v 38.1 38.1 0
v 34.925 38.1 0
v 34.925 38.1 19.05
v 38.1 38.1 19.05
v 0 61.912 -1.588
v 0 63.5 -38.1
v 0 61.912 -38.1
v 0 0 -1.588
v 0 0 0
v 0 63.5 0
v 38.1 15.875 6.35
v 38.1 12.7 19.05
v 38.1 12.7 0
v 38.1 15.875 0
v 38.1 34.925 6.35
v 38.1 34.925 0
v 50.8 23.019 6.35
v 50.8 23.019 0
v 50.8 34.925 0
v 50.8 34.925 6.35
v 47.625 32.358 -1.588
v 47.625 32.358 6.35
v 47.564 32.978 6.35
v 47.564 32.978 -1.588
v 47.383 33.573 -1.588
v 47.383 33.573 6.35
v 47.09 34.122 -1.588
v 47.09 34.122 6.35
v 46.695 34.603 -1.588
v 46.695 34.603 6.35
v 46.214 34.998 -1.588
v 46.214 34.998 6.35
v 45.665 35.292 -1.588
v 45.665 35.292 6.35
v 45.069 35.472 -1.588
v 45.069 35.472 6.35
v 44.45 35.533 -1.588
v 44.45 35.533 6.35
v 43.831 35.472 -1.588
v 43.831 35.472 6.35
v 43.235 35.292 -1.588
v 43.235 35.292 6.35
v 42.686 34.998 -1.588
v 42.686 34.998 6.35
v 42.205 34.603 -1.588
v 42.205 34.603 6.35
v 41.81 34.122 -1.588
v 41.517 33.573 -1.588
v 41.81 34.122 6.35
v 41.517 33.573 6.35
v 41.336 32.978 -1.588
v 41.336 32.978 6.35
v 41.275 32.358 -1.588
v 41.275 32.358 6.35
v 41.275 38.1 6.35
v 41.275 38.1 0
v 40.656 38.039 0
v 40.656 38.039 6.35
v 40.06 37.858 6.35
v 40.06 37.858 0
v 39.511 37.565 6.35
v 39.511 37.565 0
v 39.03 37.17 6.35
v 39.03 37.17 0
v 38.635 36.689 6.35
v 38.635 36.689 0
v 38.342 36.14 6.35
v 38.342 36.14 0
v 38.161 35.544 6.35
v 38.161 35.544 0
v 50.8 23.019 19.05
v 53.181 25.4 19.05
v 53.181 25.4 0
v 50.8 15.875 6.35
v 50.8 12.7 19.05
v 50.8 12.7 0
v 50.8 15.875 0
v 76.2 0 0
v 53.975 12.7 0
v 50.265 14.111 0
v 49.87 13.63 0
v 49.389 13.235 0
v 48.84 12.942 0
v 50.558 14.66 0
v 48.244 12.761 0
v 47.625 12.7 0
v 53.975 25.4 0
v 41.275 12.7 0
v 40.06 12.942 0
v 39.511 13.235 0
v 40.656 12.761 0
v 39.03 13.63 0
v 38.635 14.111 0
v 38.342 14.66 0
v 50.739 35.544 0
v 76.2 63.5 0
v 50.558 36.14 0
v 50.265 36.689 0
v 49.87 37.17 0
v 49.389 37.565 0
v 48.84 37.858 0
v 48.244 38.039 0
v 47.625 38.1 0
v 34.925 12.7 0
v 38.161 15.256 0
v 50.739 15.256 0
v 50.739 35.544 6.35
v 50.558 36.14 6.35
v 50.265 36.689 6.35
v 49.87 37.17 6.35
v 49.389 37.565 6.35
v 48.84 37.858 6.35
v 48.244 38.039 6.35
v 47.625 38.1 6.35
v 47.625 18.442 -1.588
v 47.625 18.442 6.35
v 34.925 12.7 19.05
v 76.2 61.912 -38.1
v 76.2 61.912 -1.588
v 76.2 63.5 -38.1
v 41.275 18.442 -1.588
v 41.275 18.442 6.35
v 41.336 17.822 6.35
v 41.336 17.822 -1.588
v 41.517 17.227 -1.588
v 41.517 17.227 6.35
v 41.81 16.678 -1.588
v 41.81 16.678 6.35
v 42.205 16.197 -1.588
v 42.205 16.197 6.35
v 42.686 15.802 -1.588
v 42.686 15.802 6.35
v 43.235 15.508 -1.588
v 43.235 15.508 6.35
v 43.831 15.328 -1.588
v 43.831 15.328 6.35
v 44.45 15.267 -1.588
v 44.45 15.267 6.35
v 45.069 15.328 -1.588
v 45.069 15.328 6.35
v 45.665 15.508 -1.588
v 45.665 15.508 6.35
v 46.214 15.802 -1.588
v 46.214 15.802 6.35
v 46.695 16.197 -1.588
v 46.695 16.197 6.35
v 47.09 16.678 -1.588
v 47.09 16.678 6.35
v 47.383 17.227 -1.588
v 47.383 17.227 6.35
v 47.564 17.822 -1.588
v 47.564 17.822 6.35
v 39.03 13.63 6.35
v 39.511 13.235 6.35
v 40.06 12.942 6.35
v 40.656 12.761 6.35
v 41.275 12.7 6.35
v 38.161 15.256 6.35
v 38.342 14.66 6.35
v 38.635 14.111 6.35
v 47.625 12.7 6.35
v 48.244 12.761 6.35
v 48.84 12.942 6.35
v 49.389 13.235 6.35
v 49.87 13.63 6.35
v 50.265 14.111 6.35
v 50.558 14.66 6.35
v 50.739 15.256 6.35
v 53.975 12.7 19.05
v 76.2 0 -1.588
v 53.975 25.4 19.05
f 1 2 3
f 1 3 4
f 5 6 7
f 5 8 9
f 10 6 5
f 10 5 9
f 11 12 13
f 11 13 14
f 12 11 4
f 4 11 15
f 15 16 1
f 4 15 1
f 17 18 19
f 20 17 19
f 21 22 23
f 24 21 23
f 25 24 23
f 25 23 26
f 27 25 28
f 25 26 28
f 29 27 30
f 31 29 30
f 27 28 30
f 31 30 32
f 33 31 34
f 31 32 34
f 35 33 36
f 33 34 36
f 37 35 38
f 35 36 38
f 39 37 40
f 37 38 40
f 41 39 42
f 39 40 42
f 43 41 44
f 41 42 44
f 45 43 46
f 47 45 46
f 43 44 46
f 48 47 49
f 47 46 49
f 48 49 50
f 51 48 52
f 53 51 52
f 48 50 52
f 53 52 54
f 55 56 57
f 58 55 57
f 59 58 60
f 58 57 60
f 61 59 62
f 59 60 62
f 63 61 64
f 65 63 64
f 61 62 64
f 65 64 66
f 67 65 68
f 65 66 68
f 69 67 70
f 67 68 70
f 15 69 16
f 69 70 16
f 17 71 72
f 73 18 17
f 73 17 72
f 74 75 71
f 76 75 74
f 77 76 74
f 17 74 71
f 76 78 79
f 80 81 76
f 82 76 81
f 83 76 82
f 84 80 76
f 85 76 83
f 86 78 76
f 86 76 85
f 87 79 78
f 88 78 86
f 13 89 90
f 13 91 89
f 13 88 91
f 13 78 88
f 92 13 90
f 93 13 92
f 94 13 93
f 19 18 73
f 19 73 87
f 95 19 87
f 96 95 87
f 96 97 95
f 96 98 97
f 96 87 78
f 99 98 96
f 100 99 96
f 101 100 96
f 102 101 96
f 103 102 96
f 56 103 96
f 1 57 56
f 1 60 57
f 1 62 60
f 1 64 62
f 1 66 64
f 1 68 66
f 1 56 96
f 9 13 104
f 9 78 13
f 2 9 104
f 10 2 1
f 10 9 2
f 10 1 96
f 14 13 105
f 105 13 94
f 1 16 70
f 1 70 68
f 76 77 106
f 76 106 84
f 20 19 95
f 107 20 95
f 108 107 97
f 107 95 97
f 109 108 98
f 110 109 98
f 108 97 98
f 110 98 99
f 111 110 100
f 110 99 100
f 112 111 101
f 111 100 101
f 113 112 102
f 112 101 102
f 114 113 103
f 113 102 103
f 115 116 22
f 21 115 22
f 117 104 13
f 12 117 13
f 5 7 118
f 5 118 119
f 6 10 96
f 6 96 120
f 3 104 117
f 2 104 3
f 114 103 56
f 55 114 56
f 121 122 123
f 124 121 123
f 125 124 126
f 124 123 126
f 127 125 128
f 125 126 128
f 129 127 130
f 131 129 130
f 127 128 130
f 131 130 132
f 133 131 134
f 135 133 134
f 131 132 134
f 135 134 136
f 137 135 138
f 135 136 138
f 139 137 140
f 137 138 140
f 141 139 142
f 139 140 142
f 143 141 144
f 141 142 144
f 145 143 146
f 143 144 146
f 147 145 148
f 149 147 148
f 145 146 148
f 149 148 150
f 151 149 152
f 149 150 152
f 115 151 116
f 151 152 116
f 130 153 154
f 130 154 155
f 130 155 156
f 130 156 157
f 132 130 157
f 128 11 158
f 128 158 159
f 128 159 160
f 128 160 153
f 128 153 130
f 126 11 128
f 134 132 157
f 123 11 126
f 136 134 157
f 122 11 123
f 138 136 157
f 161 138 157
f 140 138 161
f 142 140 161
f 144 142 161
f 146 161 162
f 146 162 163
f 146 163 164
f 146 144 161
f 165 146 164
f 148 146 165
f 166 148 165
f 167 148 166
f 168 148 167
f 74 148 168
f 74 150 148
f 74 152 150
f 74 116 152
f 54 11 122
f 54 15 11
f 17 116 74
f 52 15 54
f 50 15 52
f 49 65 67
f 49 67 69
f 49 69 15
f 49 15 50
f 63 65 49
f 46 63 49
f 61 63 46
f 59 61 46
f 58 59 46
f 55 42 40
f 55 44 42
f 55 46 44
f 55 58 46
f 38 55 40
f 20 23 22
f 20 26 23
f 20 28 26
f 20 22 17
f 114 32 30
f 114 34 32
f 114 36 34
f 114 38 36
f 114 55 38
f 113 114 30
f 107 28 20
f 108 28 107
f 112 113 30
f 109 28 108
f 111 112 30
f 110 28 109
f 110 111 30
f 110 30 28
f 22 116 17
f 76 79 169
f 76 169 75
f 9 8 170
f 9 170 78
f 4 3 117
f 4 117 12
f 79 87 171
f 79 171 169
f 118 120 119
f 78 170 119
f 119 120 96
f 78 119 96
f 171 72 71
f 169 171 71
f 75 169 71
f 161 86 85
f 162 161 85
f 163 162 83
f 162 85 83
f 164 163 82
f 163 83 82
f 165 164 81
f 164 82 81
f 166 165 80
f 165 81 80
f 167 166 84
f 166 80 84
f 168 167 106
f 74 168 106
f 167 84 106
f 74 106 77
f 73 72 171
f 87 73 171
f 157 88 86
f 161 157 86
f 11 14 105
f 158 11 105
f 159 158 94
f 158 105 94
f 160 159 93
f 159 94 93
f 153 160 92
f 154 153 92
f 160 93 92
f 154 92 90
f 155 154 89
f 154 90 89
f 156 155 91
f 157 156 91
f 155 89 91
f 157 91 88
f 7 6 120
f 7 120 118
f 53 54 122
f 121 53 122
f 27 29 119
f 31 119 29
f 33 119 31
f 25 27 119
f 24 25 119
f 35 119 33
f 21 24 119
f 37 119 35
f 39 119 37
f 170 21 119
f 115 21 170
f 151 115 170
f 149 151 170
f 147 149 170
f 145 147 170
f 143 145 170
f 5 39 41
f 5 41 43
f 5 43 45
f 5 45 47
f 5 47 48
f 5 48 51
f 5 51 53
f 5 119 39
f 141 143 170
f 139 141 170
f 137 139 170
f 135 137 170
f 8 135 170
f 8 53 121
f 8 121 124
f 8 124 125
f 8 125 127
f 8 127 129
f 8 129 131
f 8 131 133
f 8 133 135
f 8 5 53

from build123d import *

# Parameters (mm, degrees)
BOSS_EXTRUDE1_DEPTH = 76.2
BOSS_EXTRUDE2_DEPTH = 6.35
CUT_EXTRUDE1_DEPTH  = 6.35
SKETCH4_W           = 3.175
SKETCH4_H           = 25.4
BOSS_EXTRUDE3_DEPTH = 19.05


with BuildPart() as part:
    # Sketch1 → Boss-Extrude1 (new body)
    with BuildSketch(Plane(origin=(0, 0, 0), x_dir=(0, 0, -1), z_dir=(1, 0, 0))):
        Polygon((0, 0), (0, 63.5), (38.1, 63.5), (38.1, 61.9125), (1.5875, 61.9125), (1.5875, 0), align=None)
    extrude(amount=BOSS_EXTRUDE1_DEPTH)

    # Sketch2 → Boss-Extrude2 (add)
    with BuildSketch(Plane.XY):
        with BuildLine():
            Line((41.275, 12.7), (47.625, 12.7))
            ThreePointArc((47.625, 12.7), (49.87006403, 13.62993597), (50.8, 15.875))
            Line((50.8, 15.875), (50.8, 34.925))
            ThreePointArc((50.8, 34.925), (49.87006403, 37.17006403), (47.625, 38.1))
            Line((47.625, 38.1), (41.275, 38.1))
            ThreePointArc((41.275, 38.1), (39.02993597, 37.17006403), (38.1, 34.925))
            Line((38.1, 34.925), (38.1, 15.875))
            ThreePointArc((38.1, 15.875), (39.02993597, 13.62993597), (41.275, 12.7))
        make_face()
        with BuildLine():
            Line((41.275, 32.358201644), (41.275, 18.441798356))
            ThreePointArc((41.275, 18.441798356), (44.45, 15.266798356), (47.625, 18.441798356))
            Line((47.625, 18.441798356), (47.625, 32.358201644))
            ThreePointArc((47.625, 32.358201644), (44.45, 35.533201644), (41.275, 32.358201644))
        make_face(mode=Mode.SUBTRACT)
    extrude(amount=BOSS_EXTRUDE2_DEPTH)

    # Sketch3 → Cut-Extrude1 (cut)
    with BuildSketch(Plane.XY):
        with BuildLine():
            Line((47.625, 18.441798356), (47.625, 32.358201644))
            ThreePointArc((47.625, 32.358201644), (44.45, 35.533201644), (41.275, 32.358201644))
            Line((41.275, 32.358201644), (41.275, 18.441798356))
            ThreePointArc((41.275, 18.441798356), (44.45, 15.266798356), (47.625, 18.441798356))
        make_face()
    extrude(amount=-CUT_EXTRUDE1_DEPTH, mode=Mode.SUBTRACT)

    # Sketch4 → Boss-Extrude3 (add)
    with BuildSketch(Plane.XY):
        Polygon((50.8, 12.7), (50.8, 23.01875), (53.18125, 25.4), (53.975, 25.4), (53.975, 12.7), align=None)
        with Locations((36.5125, 25.4)):
            Rectangle(SKETCH4_W, SKETCH4_H)
    extrude(amount=BOSS_EXTRUDE3_DEPTH)


solid = part.part
